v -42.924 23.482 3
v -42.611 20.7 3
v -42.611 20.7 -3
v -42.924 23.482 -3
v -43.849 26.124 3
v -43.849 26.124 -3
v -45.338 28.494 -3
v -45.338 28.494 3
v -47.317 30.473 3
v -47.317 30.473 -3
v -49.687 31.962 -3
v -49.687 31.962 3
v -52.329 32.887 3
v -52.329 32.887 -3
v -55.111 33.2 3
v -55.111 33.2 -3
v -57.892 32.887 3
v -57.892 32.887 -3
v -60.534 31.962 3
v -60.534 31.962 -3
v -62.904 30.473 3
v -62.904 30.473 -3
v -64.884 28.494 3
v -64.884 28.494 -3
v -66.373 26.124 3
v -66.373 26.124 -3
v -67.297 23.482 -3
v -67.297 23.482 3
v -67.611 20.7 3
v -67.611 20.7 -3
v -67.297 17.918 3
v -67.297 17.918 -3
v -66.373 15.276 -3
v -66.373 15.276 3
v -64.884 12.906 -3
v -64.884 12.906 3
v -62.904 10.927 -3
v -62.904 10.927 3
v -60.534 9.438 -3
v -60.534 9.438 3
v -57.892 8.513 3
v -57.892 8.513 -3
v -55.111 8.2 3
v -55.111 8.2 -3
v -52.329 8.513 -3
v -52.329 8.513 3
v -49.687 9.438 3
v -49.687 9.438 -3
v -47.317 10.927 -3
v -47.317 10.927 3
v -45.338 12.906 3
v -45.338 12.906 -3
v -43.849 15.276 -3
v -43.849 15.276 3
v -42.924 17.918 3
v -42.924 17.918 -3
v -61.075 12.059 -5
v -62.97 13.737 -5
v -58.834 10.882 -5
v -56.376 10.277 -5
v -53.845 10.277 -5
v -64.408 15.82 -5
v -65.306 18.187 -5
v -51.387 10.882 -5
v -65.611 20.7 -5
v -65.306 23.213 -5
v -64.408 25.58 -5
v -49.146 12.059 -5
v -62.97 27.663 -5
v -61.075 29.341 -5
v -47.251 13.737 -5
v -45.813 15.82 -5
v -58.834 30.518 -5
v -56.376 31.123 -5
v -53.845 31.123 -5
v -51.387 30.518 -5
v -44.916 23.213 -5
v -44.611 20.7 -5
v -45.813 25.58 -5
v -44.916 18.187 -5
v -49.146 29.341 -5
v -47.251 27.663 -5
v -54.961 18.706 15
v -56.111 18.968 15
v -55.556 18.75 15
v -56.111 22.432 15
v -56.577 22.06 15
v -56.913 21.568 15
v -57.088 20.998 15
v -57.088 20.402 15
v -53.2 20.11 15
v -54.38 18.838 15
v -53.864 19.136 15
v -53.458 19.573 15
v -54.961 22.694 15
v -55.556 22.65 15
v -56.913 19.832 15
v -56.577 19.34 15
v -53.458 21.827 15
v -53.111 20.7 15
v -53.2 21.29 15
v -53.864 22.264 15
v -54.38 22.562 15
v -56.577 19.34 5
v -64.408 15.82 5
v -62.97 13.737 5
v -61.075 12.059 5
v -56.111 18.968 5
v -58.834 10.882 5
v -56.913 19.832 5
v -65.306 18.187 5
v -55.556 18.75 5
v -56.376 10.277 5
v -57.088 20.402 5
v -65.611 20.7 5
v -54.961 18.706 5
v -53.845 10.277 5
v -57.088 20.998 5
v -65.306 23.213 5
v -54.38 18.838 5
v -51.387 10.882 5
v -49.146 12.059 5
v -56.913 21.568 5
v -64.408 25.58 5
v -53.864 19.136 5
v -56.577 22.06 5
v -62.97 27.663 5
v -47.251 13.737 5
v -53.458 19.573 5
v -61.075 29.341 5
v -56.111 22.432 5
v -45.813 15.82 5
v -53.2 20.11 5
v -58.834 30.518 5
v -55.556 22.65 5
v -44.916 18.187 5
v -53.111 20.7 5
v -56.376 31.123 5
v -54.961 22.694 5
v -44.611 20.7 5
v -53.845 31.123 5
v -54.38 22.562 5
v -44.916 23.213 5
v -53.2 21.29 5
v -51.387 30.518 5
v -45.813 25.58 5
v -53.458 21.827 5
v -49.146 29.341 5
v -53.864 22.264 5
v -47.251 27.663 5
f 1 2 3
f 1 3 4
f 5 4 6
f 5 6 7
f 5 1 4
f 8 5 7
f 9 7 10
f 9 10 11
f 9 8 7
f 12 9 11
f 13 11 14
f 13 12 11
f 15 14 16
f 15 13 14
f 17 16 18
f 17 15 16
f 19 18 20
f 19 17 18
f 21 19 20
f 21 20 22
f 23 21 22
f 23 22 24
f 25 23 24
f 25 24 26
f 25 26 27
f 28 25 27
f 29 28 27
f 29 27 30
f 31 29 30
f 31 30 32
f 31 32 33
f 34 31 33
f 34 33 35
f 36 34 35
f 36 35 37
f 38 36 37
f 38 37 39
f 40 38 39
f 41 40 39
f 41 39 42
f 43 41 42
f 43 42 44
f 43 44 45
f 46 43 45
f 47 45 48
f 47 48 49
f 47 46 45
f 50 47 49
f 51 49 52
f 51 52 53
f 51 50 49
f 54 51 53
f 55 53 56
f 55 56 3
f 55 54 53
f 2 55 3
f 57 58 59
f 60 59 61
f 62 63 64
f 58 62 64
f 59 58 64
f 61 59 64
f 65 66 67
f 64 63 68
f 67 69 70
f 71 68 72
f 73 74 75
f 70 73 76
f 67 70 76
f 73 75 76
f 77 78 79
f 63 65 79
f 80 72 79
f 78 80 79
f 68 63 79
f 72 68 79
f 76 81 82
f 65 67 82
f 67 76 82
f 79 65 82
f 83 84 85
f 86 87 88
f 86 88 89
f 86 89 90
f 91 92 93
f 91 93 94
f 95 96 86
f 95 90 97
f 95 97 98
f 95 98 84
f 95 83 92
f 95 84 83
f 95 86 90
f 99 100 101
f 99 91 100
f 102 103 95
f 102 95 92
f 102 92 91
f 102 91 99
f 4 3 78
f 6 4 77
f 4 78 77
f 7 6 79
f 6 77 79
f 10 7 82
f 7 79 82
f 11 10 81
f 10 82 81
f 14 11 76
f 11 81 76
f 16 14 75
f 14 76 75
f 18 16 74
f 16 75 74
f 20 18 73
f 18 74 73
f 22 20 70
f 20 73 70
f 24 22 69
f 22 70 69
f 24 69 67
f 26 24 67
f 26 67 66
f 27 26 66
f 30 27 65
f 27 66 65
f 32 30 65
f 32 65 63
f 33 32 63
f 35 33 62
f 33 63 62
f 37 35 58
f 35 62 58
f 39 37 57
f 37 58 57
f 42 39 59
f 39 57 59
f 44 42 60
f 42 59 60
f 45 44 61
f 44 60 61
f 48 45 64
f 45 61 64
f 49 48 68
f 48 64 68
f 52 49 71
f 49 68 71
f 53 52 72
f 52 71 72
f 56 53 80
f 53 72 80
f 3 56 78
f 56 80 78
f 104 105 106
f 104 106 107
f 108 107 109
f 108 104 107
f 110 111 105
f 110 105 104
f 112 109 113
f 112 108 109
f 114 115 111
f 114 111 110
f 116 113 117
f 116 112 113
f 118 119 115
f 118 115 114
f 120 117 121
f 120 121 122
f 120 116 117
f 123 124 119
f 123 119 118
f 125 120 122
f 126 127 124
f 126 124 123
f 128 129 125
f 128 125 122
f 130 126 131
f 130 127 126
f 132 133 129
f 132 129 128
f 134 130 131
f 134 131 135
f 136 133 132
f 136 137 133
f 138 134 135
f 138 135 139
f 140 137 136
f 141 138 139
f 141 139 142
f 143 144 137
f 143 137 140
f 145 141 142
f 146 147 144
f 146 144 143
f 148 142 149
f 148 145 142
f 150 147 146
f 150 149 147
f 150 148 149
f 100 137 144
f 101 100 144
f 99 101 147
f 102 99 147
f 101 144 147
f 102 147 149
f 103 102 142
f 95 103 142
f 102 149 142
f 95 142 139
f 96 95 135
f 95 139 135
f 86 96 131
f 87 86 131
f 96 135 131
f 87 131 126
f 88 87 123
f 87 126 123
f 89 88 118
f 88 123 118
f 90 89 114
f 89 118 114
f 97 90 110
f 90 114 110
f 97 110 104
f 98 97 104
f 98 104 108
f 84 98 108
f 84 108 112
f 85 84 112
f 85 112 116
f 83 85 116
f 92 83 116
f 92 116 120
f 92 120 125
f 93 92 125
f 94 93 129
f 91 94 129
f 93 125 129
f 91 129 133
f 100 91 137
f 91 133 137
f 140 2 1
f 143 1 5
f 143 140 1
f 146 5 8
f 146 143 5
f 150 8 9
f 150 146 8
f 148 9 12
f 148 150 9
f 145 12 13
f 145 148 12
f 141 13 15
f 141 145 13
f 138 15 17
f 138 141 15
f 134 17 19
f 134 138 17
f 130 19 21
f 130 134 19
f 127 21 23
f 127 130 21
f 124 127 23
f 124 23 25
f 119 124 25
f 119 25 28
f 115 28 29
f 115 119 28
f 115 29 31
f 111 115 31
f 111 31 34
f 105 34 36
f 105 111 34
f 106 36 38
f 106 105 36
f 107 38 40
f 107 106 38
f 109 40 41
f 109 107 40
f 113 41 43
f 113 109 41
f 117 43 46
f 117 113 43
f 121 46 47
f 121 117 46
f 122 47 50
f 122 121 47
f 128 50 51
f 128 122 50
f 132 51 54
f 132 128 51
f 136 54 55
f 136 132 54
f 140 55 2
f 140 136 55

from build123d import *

# Parameters (mm, degrees)
SKETCH1_R           = 12.5
BOSS_EXTRUDE1_DEPTH = 5
CHAMFER1_SIZE       = 2
SKETCH2_R           = 2
BOSS_EXTRUDE2_DEPTH = 10


with BuildPart() as part:
    # Sketch1 → Boss-Extrude1 (new, symmetric)
    with BuildSketch(Plane.XY):
        with Locations((-55.110705908, 20.7)):
            Circle(SKETCH1_R)
    extrude(amount=BOSS_EXTRUDE1_DEPTH, both=True)

    # Chamfer1
    chamfer1_edges = [part.edges().sort_by_distance(p)[0] for p in [
        (-67.610705908, 20.7, -5),
        (-67.610705908, 20.7, 5),
    ]]
    chamfer(chamfer1_edges, length=CHAMFER1_SIZE)

    # Sketch2 → Boss-Extrude2 (add)
    with BuildSketch(Plane.XY.offset(5)):
        with Locations((-55.110705908, 20.7)):
            Circle(SKETCH2_R)
    extrude(amount=BOSS_EXTRUDE2_DEPTH)


solid = part.part
